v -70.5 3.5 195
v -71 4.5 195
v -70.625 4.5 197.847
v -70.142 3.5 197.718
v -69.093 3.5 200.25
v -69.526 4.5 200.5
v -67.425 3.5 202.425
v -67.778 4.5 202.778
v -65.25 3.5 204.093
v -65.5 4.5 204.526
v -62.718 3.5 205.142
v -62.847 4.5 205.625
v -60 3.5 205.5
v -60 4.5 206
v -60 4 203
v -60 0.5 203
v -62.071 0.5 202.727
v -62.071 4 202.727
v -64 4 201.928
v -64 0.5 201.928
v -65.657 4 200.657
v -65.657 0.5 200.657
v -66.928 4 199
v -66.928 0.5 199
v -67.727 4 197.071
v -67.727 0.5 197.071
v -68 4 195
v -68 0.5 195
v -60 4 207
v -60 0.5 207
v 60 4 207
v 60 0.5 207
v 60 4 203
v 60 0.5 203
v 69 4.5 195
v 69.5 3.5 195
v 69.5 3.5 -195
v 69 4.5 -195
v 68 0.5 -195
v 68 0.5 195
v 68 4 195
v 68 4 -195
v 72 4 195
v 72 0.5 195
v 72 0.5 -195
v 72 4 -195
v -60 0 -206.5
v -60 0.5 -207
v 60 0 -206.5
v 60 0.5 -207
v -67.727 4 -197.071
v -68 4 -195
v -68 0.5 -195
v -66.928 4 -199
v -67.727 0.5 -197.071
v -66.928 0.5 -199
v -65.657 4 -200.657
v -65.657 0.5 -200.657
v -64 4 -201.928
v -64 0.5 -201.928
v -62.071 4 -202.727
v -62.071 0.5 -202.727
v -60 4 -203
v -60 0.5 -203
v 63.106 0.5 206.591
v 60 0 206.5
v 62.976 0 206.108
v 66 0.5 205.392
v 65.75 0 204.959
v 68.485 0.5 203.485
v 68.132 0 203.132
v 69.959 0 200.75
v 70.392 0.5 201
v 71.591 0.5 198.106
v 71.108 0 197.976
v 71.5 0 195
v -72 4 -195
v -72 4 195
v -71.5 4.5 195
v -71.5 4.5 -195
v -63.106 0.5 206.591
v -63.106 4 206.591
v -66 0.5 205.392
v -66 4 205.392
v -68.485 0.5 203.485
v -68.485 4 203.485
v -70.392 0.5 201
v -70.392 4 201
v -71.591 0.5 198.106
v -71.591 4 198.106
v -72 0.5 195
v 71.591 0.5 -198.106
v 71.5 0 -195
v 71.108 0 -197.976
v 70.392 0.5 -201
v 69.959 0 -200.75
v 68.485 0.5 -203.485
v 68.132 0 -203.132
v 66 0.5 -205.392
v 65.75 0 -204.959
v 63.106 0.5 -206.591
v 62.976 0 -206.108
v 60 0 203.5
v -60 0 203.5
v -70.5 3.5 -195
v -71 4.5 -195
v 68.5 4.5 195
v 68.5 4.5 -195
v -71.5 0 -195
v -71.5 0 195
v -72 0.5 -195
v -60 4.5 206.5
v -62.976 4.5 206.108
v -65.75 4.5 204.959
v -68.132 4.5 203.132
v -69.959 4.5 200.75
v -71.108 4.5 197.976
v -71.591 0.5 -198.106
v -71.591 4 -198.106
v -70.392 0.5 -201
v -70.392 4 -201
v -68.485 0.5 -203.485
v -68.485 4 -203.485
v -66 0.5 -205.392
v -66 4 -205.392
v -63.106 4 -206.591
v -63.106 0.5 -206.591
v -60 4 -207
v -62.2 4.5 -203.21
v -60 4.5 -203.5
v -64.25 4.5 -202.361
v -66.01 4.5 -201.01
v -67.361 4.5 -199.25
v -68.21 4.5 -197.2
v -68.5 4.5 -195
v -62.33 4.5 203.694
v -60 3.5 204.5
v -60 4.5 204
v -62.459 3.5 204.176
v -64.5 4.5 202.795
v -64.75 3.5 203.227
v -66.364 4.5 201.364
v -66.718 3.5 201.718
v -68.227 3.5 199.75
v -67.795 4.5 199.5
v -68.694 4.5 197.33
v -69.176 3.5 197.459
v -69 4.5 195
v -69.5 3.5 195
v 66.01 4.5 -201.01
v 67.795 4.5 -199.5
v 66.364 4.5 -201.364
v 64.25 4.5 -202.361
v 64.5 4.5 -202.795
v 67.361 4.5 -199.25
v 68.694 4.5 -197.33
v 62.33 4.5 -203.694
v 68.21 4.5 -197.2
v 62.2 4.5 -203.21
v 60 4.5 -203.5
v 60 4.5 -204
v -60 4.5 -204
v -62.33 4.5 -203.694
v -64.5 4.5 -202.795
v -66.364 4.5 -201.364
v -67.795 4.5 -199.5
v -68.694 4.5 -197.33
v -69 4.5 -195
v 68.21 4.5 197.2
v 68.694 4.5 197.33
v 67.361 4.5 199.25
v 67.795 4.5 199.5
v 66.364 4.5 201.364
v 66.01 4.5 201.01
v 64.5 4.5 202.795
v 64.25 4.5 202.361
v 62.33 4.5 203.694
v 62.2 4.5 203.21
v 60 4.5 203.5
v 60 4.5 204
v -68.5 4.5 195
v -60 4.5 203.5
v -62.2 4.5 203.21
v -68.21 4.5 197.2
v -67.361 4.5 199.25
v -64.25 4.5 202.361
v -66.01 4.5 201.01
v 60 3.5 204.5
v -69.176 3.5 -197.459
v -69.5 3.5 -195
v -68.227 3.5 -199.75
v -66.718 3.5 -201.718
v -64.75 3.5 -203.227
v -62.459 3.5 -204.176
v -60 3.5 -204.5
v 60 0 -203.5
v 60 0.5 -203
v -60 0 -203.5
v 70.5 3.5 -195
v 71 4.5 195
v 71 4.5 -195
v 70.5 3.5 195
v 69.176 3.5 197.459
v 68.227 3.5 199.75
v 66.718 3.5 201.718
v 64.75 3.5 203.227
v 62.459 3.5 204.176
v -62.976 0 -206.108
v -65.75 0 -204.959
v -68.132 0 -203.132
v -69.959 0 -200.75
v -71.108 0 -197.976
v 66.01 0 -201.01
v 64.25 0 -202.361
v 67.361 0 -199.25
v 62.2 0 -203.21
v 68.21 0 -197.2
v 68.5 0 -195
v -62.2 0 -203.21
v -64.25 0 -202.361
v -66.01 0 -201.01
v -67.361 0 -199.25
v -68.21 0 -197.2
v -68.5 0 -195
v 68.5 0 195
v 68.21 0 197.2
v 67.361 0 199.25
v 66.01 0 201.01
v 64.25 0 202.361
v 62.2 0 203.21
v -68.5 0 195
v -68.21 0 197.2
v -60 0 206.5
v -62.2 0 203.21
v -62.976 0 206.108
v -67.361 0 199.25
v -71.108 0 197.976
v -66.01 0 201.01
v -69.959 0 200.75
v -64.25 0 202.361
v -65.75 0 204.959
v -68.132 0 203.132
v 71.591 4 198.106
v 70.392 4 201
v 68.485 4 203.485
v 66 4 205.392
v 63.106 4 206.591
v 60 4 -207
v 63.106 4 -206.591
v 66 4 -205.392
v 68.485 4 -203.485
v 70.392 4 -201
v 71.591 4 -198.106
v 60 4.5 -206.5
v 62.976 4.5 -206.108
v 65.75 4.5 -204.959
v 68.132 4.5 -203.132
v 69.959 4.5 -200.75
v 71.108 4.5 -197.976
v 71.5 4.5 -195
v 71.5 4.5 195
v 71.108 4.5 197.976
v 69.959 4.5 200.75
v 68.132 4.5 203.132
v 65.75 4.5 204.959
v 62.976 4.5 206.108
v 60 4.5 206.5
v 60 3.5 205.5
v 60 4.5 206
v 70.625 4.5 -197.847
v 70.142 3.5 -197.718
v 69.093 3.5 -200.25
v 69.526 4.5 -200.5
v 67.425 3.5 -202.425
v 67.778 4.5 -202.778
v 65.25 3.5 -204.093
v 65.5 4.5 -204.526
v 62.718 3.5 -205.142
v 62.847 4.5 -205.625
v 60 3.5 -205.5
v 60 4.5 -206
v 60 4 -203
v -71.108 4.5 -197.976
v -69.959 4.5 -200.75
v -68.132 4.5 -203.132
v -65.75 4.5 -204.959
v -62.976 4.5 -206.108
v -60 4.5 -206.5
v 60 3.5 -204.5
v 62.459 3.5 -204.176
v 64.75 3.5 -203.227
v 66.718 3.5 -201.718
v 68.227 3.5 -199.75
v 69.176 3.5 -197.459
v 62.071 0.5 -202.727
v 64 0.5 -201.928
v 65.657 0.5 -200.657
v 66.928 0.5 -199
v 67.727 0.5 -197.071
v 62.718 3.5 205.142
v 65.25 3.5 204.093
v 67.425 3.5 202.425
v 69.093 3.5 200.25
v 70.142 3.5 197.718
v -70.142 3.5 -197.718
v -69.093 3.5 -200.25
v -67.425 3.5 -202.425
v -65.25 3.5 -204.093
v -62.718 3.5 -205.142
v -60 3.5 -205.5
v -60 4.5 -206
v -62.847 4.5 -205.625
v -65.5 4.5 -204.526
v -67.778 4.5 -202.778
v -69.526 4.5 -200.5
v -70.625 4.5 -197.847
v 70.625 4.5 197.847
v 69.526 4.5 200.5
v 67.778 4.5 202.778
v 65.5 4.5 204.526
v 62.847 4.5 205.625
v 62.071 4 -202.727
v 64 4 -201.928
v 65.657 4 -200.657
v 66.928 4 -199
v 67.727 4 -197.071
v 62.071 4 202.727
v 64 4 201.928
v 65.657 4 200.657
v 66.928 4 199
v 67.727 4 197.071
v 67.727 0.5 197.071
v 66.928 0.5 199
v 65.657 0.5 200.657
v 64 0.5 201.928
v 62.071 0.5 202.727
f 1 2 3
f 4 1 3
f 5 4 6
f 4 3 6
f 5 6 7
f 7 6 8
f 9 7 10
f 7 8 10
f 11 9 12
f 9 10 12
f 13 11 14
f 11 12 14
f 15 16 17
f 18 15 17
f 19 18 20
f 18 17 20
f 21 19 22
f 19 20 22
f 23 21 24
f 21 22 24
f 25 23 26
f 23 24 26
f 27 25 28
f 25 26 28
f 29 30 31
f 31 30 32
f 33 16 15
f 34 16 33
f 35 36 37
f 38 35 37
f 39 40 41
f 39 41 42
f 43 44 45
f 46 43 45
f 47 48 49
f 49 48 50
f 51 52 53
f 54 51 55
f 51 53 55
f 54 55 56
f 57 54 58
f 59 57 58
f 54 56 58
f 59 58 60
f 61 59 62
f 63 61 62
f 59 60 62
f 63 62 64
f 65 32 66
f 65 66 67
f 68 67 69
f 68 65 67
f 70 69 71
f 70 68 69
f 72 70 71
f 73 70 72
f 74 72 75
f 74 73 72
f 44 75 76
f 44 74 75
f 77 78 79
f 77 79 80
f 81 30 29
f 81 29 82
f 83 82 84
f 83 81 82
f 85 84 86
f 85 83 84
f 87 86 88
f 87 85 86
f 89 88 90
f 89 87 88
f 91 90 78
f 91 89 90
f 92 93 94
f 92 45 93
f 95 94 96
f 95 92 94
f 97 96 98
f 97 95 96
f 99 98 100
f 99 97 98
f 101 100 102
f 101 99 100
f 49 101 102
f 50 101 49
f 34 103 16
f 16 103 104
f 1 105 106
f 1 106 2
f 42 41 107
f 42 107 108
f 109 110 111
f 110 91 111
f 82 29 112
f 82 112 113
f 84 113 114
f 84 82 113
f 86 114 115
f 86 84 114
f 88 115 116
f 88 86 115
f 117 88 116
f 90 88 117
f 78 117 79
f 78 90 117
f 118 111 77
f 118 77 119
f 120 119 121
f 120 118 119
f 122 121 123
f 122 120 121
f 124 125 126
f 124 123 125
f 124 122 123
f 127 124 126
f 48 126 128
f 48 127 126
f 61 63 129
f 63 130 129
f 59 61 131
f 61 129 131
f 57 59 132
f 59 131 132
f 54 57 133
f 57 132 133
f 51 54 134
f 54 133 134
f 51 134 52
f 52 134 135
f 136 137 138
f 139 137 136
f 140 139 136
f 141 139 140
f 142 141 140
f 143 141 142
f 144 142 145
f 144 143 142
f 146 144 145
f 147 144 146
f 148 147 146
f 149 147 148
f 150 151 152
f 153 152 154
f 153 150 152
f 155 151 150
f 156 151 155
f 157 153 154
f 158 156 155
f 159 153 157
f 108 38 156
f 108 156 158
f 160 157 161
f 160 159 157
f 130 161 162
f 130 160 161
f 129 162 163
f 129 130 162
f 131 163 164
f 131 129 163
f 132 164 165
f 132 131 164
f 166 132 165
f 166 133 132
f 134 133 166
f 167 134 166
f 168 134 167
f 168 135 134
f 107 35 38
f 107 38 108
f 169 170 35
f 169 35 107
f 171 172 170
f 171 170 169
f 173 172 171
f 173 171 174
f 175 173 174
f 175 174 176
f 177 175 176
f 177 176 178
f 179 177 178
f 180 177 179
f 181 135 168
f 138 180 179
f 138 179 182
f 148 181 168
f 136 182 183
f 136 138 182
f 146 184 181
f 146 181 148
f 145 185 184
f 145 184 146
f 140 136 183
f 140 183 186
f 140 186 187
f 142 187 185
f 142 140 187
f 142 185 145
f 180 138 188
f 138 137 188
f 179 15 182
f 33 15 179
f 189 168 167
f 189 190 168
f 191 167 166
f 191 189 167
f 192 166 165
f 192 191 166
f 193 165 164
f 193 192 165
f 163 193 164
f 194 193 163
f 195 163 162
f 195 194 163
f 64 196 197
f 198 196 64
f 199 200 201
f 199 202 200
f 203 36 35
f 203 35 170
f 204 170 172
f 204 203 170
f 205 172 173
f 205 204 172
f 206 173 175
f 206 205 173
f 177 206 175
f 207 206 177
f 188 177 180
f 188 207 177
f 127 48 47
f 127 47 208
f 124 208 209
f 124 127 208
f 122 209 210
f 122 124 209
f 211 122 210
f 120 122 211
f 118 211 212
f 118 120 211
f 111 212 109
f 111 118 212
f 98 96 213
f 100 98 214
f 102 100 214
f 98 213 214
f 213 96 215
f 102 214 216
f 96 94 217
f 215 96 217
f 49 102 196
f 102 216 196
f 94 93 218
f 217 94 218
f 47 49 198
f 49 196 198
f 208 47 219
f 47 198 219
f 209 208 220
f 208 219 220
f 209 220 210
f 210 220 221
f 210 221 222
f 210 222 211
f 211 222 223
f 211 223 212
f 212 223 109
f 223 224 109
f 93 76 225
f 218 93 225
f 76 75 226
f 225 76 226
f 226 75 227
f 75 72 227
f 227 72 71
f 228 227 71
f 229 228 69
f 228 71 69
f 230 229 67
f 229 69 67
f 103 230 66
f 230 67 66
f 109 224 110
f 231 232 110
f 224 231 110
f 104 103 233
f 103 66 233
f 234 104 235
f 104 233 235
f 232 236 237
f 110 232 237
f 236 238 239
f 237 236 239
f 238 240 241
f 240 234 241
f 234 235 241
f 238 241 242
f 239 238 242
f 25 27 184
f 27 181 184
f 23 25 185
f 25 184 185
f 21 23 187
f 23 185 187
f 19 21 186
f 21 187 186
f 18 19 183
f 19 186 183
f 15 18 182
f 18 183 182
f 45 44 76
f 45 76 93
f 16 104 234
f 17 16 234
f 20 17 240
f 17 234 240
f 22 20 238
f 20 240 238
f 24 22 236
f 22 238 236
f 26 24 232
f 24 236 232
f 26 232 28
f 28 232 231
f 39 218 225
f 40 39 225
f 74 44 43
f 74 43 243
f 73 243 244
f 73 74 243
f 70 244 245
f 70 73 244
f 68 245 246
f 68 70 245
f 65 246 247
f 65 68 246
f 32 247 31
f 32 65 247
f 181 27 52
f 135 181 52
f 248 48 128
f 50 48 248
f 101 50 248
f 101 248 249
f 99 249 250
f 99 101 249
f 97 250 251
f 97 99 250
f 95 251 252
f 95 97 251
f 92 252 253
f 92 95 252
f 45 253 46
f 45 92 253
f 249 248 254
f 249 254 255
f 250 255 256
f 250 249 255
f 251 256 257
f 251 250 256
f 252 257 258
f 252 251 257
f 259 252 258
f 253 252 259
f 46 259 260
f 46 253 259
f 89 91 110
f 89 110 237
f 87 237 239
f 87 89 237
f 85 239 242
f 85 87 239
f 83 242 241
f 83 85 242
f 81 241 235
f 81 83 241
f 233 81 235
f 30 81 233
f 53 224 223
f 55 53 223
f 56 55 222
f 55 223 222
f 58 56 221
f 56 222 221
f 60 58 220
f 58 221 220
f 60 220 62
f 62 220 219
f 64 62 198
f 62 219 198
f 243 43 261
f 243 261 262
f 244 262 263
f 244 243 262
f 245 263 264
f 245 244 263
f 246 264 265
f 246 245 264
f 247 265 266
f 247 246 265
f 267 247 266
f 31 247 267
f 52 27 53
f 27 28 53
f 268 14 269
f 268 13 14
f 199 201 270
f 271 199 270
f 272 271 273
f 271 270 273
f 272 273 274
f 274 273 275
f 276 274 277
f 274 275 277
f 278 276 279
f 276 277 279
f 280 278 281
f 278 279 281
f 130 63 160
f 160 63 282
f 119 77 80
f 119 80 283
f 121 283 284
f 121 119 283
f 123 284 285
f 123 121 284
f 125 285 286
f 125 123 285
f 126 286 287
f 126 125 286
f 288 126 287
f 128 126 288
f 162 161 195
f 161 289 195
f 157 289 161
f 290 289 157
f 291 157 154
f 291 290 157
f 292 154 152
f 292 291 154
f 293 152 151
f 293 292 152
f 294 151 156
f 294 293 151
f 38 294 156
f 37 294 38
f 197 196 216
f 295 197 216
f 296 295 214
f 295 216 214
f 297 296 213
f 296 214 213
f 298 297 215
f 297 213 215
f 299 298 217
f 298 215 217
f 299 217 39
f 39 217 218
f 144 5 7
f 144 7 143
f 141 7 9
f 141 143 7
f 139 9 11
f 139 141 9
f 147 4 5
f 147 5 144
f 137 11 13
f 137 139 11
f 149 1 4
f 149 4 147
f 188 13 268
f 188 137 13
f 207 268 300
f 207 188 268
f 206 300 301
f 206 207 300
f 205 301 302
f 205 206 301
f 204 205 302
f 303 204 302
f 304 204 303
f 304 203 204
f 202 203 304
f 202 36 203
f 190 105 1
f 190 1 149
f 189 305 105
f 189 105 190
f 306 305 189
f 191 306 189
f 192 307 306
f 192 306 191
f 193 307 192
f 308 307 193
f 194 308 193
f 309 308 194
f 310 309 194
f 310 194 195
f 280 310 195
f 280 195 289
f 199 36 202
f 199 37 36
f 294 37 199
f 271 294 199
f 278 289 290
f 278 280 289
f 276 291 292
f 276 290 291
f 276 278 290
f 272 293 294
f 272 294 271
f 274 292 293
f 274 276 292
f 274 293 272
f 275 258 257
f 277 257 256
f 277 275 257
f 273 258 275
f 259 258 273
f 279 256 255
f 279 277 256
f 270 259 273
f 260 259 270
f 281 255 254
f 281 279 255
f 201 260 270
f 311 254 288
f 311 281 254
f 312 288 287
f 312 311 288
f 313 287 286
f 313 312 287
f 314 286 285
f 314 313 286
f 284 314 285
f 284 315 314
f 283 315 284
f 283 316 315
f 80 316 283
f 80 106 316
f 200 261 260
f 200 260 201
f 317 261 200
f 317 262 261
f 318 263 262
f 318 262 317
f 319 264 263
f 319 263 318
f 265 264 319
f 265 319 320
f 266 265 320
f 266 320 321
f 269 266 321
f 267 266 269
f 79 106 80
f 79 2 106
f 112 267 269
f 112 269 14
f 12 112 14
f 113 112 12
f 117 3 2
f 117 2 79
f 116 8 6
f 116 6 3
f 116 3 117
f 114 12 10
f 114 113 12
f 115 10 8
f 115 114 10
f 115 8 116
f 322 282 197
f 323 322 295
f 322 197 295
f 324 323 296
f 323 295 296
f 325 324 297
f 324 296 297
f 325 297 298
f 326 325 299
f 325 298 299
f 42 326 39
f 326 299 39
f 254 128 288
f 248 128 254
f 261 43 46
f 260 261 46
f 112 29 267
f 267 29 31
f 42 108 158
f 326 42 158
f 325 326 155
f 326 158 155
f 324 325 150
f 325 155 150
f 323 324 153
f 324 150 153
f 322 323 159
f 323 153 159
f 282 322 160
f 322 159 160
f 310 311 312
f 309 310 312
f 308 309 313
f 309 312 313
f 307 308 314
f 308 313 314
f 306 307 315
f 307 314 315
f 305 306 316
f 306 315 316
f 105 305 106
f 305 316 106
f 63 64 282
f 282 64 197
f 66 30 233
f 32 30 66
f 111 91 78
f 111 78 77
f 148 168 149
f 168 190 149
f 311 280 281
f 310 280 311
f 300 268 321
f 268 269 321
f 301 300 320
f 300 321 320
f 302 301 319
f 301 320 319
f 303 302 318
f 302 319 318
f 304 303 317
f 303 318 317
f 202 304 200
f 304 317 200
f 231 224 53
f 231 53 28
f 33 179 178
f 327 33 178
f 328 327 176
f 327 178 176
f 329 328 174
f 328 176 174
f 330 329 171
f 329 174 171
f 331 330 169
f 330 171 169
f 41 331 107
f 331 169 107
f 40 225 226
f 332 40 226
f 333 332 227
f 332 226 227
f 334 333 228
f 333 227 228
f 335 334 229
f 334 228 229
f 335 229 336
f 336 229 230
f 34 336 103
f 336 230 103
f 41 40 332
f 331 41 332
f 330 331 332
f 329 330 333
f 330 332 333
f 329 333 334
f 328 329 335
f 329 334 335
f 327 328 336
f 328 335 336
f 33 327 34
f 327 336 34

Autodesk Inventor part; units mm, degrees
ref_plane "YZ Plane" through (0, 0, 0) normal (1, 0, 0) x (0, 1, 0)
ref_plane "XZ Plane" through (0, 0, 0) normal (0, 1, 0) x (-1, 0, 0)
ref_plane "XY Plane" through (0, 0, 0) normal (0, 0, 1) x (1, 0, 0)
sketch "Sketch1" plane through (0, 0, 0) normal (0, 1, 0) x (-1, 0, 0)
  circle A0 centre (60, 195) radius 12
  circle A1 centre (60, -195) radius 12
  circle A2 centre (-60, 195) radius 12
  circle A3 centre (-60, -195) radius 12
  line L0 (72, 195) -> (72, -195)
  line L1 (60, -207) -> (-60, -207)
  line L2 (60, 207) -> (-60, 207)
  line L3 (-72, 195) -> (-72, -195)
  line L4 (68, 195) -> (68, -195)
  circle A4 centre (60, 195) radius 8
  line L5 (60, 203) -> (-60, 203)
  circle A5 centre (-60, 195) radius 8
  line L6 (-68, 195) -> (-68, -195)
  circle A6 centre (-60, -195) radius 8
  line L7 (60, -203) -> (-60, -203)
  circle A7 centre (60, -195) radius 8
  point P0 (0, 0)
  point P1 (72, 0)
  point P2 (0, 207)
  point P3 (35, 143)
  point P4 (68, 135)
  point P5 (68, -135)
  point P6 (35, -143)
  point P7 (-60, -203)
  point P8 (-68, -135)
  point P9 (-68, 135)
  point P10 (-60, 203)
  dimension "d0" = 24
  dimension "d1" = 24
  dimension "d2" = 24
  dimension "d3" = 24
  dimension "d6" = 4
  dimension "d7" = 4
  dimension "d8" = 4
  dimension "d9" = 4
  dimension "d10" = 4
  dimension "d11" = 4
  dimension "d12" = 4
  dimension "d13" = 4
  dimension "d35" = 414
  dimension "d36" = 144
extrude "Extrusion1" add sketch "Sketch1" along normal blind 4.5 contours A0 L4 A4 L5 | L0 A1 L4 A0 | A0 L5 A2 L2 | A1 L7 A7 L4 | A2 L5 A5 L6 | L1 A3 L7 A1 | A2 L6 A3 L3 | A3 L6 A6 L7 picked at (54.6594, 203.5636) picked at (54.6594, -203.5636) picked at (-54.6594, 203.5636) picked at (-54.6594, -203.5636)
sketch "Sketch2" plane through (0, 4.5, 0) normal (0, 1, 0) x (1, 0, 0)
  line L0 (-72, 195) -> (-72, -195) projected
  arc A0 (-72, -195) -> (-60, -207) centre (-60, -195) ccw projected
  line L1 (-60, -207) -> (60, -207) projected
  arc A1 (60, -207) -> (72, -195) centre (60, -195) ccw projected
  line L2 (72, -195) -> (72, 195) projected
  arc A2 (72, 195) -> (60, 207) centre (60, 195) ccw projected
  line L3 (60, 207) -> (-60, 207) projected
  arc A3 (-60, 207) -> (-72, 195) centre (-60, 195) ccw projected
  line L4 (-69.5, -195) -> (-69.5, 195)
  arc A4 (-60, 204.5) -> (-69.5, 195) centre (-60, 195) ccw
  line L5 (-60, 204.5) -> (60, 204.5)
  arc A5 (69.5, 195) -> (60, 204.5) centre (60, 195) ccw
  line L6 (69.5, 195) -> (69.5, -195)
  arc A6 (60, -204.5) -> (69.5, -195) centre (60, -195) ccw
  line L7 (60, -204.5) -> (-60, -204.5)
  arc A7 (-69.5, -195) -> (-60, -204.5) centre (-60, -195) ccw
  line L8 (-70.5, -195) -> (-70.5, 195)
  arc A8 (-60, 205.5) -> (-70.5, 195) centre (-60, 195) ccw
  line L9 (-60, 205.5) -> (60, 205.5)
  arc A9 (70.5, 195) -> (60, 205.5) centre (60, 195) ccw
  line L10 (70.5, 195) -> (70.5, -195)
  arc A10 (60, -205.5) -> (70.5, -195) centre (60, -195) ccw
  line L11 (60, -205.5) -> (-60, -205.5)
  arc A11 (-70.5, -195) -> (-60, -205.5) centre (-60, -195) ccw
  point P0 (0, 0)
  dimension "d16" = 2.5
  dimension "d17" = 1.5
extrude "Extrusion2" cut sketch "Sketch2" against normal blind 1 contours L8 A8 L9 A9 L10 A10 L11 A11
chamfer "Chamfer3" distance 0.5 distance2 1 8 edges at (0, 4.5, 205.5) (-67.4246, 4.5, 202.4246) (-70.5, 4.5, 0) (-67.4246, 4.5, -202.4246) (0, 4.5, -205.5) (67.4246, 4.5, -202.4246) (70.5, 4.5, 0) (67.4246, 4.5, 202.4246) measured on face at (-71, 4.5, 65)
chamfer "Chamfer4" distance 0.5 distance2 1 8 edges at (0, 4.5, 204.5) (66.7175, 4.5, 201.7175) (69.5, 4.5, 0) (66.7175, 4.5, -201.7175) (0, 4.5, -204.5) (-66.7175, 4.5, -201.7175) (-69.5, 4.5, 0) (-66.7175, 4.5, 201.7175) measured on face at (-69, 4.5, -65)
chamfer "Chamfer5" distance 0.5 angle 45 32 edges at (0, 4.5, 207) (68.4853, 4.5, 203.4853) (72, 4.5, 0) (68.4853, 4.5, -203.4853) (0, 4.5, -207) (-68.4853, 4.5, -203.4853) (-72, 4.5, 0) (-68.4853, 4.5, 203.4853) (0, 4.5, 203) (-65.6569, 4.5, 200.6569) (-68, 4.5, 0) (-65.6569, 4.5, -200.6569) (0, 4.5, -203) (65.6569, 4.5, -200.6569) (68, 4.5, 0) (65.6569, 4.5, 200.6569) (68.4853, 0, 203.4853) (72, 0, 0) (68.4853, 0, -203.4853) (0, 0, -207) (-68.4853, 0, -203.4853) (-72, 0, 0) (-68.4853, 0, 203.4853) (0, 0, 207) (0, 0, 203) (-65.6569, 0, 200.6569) (-68, 0, 0) (-65.6569, 0, -200.6569) (0, 0, -203) (65.6569, 0, -200.6569) (68, 0, 0) (65.6569, 0, 200.6569)
properties part number "LI0005-SEAL"
